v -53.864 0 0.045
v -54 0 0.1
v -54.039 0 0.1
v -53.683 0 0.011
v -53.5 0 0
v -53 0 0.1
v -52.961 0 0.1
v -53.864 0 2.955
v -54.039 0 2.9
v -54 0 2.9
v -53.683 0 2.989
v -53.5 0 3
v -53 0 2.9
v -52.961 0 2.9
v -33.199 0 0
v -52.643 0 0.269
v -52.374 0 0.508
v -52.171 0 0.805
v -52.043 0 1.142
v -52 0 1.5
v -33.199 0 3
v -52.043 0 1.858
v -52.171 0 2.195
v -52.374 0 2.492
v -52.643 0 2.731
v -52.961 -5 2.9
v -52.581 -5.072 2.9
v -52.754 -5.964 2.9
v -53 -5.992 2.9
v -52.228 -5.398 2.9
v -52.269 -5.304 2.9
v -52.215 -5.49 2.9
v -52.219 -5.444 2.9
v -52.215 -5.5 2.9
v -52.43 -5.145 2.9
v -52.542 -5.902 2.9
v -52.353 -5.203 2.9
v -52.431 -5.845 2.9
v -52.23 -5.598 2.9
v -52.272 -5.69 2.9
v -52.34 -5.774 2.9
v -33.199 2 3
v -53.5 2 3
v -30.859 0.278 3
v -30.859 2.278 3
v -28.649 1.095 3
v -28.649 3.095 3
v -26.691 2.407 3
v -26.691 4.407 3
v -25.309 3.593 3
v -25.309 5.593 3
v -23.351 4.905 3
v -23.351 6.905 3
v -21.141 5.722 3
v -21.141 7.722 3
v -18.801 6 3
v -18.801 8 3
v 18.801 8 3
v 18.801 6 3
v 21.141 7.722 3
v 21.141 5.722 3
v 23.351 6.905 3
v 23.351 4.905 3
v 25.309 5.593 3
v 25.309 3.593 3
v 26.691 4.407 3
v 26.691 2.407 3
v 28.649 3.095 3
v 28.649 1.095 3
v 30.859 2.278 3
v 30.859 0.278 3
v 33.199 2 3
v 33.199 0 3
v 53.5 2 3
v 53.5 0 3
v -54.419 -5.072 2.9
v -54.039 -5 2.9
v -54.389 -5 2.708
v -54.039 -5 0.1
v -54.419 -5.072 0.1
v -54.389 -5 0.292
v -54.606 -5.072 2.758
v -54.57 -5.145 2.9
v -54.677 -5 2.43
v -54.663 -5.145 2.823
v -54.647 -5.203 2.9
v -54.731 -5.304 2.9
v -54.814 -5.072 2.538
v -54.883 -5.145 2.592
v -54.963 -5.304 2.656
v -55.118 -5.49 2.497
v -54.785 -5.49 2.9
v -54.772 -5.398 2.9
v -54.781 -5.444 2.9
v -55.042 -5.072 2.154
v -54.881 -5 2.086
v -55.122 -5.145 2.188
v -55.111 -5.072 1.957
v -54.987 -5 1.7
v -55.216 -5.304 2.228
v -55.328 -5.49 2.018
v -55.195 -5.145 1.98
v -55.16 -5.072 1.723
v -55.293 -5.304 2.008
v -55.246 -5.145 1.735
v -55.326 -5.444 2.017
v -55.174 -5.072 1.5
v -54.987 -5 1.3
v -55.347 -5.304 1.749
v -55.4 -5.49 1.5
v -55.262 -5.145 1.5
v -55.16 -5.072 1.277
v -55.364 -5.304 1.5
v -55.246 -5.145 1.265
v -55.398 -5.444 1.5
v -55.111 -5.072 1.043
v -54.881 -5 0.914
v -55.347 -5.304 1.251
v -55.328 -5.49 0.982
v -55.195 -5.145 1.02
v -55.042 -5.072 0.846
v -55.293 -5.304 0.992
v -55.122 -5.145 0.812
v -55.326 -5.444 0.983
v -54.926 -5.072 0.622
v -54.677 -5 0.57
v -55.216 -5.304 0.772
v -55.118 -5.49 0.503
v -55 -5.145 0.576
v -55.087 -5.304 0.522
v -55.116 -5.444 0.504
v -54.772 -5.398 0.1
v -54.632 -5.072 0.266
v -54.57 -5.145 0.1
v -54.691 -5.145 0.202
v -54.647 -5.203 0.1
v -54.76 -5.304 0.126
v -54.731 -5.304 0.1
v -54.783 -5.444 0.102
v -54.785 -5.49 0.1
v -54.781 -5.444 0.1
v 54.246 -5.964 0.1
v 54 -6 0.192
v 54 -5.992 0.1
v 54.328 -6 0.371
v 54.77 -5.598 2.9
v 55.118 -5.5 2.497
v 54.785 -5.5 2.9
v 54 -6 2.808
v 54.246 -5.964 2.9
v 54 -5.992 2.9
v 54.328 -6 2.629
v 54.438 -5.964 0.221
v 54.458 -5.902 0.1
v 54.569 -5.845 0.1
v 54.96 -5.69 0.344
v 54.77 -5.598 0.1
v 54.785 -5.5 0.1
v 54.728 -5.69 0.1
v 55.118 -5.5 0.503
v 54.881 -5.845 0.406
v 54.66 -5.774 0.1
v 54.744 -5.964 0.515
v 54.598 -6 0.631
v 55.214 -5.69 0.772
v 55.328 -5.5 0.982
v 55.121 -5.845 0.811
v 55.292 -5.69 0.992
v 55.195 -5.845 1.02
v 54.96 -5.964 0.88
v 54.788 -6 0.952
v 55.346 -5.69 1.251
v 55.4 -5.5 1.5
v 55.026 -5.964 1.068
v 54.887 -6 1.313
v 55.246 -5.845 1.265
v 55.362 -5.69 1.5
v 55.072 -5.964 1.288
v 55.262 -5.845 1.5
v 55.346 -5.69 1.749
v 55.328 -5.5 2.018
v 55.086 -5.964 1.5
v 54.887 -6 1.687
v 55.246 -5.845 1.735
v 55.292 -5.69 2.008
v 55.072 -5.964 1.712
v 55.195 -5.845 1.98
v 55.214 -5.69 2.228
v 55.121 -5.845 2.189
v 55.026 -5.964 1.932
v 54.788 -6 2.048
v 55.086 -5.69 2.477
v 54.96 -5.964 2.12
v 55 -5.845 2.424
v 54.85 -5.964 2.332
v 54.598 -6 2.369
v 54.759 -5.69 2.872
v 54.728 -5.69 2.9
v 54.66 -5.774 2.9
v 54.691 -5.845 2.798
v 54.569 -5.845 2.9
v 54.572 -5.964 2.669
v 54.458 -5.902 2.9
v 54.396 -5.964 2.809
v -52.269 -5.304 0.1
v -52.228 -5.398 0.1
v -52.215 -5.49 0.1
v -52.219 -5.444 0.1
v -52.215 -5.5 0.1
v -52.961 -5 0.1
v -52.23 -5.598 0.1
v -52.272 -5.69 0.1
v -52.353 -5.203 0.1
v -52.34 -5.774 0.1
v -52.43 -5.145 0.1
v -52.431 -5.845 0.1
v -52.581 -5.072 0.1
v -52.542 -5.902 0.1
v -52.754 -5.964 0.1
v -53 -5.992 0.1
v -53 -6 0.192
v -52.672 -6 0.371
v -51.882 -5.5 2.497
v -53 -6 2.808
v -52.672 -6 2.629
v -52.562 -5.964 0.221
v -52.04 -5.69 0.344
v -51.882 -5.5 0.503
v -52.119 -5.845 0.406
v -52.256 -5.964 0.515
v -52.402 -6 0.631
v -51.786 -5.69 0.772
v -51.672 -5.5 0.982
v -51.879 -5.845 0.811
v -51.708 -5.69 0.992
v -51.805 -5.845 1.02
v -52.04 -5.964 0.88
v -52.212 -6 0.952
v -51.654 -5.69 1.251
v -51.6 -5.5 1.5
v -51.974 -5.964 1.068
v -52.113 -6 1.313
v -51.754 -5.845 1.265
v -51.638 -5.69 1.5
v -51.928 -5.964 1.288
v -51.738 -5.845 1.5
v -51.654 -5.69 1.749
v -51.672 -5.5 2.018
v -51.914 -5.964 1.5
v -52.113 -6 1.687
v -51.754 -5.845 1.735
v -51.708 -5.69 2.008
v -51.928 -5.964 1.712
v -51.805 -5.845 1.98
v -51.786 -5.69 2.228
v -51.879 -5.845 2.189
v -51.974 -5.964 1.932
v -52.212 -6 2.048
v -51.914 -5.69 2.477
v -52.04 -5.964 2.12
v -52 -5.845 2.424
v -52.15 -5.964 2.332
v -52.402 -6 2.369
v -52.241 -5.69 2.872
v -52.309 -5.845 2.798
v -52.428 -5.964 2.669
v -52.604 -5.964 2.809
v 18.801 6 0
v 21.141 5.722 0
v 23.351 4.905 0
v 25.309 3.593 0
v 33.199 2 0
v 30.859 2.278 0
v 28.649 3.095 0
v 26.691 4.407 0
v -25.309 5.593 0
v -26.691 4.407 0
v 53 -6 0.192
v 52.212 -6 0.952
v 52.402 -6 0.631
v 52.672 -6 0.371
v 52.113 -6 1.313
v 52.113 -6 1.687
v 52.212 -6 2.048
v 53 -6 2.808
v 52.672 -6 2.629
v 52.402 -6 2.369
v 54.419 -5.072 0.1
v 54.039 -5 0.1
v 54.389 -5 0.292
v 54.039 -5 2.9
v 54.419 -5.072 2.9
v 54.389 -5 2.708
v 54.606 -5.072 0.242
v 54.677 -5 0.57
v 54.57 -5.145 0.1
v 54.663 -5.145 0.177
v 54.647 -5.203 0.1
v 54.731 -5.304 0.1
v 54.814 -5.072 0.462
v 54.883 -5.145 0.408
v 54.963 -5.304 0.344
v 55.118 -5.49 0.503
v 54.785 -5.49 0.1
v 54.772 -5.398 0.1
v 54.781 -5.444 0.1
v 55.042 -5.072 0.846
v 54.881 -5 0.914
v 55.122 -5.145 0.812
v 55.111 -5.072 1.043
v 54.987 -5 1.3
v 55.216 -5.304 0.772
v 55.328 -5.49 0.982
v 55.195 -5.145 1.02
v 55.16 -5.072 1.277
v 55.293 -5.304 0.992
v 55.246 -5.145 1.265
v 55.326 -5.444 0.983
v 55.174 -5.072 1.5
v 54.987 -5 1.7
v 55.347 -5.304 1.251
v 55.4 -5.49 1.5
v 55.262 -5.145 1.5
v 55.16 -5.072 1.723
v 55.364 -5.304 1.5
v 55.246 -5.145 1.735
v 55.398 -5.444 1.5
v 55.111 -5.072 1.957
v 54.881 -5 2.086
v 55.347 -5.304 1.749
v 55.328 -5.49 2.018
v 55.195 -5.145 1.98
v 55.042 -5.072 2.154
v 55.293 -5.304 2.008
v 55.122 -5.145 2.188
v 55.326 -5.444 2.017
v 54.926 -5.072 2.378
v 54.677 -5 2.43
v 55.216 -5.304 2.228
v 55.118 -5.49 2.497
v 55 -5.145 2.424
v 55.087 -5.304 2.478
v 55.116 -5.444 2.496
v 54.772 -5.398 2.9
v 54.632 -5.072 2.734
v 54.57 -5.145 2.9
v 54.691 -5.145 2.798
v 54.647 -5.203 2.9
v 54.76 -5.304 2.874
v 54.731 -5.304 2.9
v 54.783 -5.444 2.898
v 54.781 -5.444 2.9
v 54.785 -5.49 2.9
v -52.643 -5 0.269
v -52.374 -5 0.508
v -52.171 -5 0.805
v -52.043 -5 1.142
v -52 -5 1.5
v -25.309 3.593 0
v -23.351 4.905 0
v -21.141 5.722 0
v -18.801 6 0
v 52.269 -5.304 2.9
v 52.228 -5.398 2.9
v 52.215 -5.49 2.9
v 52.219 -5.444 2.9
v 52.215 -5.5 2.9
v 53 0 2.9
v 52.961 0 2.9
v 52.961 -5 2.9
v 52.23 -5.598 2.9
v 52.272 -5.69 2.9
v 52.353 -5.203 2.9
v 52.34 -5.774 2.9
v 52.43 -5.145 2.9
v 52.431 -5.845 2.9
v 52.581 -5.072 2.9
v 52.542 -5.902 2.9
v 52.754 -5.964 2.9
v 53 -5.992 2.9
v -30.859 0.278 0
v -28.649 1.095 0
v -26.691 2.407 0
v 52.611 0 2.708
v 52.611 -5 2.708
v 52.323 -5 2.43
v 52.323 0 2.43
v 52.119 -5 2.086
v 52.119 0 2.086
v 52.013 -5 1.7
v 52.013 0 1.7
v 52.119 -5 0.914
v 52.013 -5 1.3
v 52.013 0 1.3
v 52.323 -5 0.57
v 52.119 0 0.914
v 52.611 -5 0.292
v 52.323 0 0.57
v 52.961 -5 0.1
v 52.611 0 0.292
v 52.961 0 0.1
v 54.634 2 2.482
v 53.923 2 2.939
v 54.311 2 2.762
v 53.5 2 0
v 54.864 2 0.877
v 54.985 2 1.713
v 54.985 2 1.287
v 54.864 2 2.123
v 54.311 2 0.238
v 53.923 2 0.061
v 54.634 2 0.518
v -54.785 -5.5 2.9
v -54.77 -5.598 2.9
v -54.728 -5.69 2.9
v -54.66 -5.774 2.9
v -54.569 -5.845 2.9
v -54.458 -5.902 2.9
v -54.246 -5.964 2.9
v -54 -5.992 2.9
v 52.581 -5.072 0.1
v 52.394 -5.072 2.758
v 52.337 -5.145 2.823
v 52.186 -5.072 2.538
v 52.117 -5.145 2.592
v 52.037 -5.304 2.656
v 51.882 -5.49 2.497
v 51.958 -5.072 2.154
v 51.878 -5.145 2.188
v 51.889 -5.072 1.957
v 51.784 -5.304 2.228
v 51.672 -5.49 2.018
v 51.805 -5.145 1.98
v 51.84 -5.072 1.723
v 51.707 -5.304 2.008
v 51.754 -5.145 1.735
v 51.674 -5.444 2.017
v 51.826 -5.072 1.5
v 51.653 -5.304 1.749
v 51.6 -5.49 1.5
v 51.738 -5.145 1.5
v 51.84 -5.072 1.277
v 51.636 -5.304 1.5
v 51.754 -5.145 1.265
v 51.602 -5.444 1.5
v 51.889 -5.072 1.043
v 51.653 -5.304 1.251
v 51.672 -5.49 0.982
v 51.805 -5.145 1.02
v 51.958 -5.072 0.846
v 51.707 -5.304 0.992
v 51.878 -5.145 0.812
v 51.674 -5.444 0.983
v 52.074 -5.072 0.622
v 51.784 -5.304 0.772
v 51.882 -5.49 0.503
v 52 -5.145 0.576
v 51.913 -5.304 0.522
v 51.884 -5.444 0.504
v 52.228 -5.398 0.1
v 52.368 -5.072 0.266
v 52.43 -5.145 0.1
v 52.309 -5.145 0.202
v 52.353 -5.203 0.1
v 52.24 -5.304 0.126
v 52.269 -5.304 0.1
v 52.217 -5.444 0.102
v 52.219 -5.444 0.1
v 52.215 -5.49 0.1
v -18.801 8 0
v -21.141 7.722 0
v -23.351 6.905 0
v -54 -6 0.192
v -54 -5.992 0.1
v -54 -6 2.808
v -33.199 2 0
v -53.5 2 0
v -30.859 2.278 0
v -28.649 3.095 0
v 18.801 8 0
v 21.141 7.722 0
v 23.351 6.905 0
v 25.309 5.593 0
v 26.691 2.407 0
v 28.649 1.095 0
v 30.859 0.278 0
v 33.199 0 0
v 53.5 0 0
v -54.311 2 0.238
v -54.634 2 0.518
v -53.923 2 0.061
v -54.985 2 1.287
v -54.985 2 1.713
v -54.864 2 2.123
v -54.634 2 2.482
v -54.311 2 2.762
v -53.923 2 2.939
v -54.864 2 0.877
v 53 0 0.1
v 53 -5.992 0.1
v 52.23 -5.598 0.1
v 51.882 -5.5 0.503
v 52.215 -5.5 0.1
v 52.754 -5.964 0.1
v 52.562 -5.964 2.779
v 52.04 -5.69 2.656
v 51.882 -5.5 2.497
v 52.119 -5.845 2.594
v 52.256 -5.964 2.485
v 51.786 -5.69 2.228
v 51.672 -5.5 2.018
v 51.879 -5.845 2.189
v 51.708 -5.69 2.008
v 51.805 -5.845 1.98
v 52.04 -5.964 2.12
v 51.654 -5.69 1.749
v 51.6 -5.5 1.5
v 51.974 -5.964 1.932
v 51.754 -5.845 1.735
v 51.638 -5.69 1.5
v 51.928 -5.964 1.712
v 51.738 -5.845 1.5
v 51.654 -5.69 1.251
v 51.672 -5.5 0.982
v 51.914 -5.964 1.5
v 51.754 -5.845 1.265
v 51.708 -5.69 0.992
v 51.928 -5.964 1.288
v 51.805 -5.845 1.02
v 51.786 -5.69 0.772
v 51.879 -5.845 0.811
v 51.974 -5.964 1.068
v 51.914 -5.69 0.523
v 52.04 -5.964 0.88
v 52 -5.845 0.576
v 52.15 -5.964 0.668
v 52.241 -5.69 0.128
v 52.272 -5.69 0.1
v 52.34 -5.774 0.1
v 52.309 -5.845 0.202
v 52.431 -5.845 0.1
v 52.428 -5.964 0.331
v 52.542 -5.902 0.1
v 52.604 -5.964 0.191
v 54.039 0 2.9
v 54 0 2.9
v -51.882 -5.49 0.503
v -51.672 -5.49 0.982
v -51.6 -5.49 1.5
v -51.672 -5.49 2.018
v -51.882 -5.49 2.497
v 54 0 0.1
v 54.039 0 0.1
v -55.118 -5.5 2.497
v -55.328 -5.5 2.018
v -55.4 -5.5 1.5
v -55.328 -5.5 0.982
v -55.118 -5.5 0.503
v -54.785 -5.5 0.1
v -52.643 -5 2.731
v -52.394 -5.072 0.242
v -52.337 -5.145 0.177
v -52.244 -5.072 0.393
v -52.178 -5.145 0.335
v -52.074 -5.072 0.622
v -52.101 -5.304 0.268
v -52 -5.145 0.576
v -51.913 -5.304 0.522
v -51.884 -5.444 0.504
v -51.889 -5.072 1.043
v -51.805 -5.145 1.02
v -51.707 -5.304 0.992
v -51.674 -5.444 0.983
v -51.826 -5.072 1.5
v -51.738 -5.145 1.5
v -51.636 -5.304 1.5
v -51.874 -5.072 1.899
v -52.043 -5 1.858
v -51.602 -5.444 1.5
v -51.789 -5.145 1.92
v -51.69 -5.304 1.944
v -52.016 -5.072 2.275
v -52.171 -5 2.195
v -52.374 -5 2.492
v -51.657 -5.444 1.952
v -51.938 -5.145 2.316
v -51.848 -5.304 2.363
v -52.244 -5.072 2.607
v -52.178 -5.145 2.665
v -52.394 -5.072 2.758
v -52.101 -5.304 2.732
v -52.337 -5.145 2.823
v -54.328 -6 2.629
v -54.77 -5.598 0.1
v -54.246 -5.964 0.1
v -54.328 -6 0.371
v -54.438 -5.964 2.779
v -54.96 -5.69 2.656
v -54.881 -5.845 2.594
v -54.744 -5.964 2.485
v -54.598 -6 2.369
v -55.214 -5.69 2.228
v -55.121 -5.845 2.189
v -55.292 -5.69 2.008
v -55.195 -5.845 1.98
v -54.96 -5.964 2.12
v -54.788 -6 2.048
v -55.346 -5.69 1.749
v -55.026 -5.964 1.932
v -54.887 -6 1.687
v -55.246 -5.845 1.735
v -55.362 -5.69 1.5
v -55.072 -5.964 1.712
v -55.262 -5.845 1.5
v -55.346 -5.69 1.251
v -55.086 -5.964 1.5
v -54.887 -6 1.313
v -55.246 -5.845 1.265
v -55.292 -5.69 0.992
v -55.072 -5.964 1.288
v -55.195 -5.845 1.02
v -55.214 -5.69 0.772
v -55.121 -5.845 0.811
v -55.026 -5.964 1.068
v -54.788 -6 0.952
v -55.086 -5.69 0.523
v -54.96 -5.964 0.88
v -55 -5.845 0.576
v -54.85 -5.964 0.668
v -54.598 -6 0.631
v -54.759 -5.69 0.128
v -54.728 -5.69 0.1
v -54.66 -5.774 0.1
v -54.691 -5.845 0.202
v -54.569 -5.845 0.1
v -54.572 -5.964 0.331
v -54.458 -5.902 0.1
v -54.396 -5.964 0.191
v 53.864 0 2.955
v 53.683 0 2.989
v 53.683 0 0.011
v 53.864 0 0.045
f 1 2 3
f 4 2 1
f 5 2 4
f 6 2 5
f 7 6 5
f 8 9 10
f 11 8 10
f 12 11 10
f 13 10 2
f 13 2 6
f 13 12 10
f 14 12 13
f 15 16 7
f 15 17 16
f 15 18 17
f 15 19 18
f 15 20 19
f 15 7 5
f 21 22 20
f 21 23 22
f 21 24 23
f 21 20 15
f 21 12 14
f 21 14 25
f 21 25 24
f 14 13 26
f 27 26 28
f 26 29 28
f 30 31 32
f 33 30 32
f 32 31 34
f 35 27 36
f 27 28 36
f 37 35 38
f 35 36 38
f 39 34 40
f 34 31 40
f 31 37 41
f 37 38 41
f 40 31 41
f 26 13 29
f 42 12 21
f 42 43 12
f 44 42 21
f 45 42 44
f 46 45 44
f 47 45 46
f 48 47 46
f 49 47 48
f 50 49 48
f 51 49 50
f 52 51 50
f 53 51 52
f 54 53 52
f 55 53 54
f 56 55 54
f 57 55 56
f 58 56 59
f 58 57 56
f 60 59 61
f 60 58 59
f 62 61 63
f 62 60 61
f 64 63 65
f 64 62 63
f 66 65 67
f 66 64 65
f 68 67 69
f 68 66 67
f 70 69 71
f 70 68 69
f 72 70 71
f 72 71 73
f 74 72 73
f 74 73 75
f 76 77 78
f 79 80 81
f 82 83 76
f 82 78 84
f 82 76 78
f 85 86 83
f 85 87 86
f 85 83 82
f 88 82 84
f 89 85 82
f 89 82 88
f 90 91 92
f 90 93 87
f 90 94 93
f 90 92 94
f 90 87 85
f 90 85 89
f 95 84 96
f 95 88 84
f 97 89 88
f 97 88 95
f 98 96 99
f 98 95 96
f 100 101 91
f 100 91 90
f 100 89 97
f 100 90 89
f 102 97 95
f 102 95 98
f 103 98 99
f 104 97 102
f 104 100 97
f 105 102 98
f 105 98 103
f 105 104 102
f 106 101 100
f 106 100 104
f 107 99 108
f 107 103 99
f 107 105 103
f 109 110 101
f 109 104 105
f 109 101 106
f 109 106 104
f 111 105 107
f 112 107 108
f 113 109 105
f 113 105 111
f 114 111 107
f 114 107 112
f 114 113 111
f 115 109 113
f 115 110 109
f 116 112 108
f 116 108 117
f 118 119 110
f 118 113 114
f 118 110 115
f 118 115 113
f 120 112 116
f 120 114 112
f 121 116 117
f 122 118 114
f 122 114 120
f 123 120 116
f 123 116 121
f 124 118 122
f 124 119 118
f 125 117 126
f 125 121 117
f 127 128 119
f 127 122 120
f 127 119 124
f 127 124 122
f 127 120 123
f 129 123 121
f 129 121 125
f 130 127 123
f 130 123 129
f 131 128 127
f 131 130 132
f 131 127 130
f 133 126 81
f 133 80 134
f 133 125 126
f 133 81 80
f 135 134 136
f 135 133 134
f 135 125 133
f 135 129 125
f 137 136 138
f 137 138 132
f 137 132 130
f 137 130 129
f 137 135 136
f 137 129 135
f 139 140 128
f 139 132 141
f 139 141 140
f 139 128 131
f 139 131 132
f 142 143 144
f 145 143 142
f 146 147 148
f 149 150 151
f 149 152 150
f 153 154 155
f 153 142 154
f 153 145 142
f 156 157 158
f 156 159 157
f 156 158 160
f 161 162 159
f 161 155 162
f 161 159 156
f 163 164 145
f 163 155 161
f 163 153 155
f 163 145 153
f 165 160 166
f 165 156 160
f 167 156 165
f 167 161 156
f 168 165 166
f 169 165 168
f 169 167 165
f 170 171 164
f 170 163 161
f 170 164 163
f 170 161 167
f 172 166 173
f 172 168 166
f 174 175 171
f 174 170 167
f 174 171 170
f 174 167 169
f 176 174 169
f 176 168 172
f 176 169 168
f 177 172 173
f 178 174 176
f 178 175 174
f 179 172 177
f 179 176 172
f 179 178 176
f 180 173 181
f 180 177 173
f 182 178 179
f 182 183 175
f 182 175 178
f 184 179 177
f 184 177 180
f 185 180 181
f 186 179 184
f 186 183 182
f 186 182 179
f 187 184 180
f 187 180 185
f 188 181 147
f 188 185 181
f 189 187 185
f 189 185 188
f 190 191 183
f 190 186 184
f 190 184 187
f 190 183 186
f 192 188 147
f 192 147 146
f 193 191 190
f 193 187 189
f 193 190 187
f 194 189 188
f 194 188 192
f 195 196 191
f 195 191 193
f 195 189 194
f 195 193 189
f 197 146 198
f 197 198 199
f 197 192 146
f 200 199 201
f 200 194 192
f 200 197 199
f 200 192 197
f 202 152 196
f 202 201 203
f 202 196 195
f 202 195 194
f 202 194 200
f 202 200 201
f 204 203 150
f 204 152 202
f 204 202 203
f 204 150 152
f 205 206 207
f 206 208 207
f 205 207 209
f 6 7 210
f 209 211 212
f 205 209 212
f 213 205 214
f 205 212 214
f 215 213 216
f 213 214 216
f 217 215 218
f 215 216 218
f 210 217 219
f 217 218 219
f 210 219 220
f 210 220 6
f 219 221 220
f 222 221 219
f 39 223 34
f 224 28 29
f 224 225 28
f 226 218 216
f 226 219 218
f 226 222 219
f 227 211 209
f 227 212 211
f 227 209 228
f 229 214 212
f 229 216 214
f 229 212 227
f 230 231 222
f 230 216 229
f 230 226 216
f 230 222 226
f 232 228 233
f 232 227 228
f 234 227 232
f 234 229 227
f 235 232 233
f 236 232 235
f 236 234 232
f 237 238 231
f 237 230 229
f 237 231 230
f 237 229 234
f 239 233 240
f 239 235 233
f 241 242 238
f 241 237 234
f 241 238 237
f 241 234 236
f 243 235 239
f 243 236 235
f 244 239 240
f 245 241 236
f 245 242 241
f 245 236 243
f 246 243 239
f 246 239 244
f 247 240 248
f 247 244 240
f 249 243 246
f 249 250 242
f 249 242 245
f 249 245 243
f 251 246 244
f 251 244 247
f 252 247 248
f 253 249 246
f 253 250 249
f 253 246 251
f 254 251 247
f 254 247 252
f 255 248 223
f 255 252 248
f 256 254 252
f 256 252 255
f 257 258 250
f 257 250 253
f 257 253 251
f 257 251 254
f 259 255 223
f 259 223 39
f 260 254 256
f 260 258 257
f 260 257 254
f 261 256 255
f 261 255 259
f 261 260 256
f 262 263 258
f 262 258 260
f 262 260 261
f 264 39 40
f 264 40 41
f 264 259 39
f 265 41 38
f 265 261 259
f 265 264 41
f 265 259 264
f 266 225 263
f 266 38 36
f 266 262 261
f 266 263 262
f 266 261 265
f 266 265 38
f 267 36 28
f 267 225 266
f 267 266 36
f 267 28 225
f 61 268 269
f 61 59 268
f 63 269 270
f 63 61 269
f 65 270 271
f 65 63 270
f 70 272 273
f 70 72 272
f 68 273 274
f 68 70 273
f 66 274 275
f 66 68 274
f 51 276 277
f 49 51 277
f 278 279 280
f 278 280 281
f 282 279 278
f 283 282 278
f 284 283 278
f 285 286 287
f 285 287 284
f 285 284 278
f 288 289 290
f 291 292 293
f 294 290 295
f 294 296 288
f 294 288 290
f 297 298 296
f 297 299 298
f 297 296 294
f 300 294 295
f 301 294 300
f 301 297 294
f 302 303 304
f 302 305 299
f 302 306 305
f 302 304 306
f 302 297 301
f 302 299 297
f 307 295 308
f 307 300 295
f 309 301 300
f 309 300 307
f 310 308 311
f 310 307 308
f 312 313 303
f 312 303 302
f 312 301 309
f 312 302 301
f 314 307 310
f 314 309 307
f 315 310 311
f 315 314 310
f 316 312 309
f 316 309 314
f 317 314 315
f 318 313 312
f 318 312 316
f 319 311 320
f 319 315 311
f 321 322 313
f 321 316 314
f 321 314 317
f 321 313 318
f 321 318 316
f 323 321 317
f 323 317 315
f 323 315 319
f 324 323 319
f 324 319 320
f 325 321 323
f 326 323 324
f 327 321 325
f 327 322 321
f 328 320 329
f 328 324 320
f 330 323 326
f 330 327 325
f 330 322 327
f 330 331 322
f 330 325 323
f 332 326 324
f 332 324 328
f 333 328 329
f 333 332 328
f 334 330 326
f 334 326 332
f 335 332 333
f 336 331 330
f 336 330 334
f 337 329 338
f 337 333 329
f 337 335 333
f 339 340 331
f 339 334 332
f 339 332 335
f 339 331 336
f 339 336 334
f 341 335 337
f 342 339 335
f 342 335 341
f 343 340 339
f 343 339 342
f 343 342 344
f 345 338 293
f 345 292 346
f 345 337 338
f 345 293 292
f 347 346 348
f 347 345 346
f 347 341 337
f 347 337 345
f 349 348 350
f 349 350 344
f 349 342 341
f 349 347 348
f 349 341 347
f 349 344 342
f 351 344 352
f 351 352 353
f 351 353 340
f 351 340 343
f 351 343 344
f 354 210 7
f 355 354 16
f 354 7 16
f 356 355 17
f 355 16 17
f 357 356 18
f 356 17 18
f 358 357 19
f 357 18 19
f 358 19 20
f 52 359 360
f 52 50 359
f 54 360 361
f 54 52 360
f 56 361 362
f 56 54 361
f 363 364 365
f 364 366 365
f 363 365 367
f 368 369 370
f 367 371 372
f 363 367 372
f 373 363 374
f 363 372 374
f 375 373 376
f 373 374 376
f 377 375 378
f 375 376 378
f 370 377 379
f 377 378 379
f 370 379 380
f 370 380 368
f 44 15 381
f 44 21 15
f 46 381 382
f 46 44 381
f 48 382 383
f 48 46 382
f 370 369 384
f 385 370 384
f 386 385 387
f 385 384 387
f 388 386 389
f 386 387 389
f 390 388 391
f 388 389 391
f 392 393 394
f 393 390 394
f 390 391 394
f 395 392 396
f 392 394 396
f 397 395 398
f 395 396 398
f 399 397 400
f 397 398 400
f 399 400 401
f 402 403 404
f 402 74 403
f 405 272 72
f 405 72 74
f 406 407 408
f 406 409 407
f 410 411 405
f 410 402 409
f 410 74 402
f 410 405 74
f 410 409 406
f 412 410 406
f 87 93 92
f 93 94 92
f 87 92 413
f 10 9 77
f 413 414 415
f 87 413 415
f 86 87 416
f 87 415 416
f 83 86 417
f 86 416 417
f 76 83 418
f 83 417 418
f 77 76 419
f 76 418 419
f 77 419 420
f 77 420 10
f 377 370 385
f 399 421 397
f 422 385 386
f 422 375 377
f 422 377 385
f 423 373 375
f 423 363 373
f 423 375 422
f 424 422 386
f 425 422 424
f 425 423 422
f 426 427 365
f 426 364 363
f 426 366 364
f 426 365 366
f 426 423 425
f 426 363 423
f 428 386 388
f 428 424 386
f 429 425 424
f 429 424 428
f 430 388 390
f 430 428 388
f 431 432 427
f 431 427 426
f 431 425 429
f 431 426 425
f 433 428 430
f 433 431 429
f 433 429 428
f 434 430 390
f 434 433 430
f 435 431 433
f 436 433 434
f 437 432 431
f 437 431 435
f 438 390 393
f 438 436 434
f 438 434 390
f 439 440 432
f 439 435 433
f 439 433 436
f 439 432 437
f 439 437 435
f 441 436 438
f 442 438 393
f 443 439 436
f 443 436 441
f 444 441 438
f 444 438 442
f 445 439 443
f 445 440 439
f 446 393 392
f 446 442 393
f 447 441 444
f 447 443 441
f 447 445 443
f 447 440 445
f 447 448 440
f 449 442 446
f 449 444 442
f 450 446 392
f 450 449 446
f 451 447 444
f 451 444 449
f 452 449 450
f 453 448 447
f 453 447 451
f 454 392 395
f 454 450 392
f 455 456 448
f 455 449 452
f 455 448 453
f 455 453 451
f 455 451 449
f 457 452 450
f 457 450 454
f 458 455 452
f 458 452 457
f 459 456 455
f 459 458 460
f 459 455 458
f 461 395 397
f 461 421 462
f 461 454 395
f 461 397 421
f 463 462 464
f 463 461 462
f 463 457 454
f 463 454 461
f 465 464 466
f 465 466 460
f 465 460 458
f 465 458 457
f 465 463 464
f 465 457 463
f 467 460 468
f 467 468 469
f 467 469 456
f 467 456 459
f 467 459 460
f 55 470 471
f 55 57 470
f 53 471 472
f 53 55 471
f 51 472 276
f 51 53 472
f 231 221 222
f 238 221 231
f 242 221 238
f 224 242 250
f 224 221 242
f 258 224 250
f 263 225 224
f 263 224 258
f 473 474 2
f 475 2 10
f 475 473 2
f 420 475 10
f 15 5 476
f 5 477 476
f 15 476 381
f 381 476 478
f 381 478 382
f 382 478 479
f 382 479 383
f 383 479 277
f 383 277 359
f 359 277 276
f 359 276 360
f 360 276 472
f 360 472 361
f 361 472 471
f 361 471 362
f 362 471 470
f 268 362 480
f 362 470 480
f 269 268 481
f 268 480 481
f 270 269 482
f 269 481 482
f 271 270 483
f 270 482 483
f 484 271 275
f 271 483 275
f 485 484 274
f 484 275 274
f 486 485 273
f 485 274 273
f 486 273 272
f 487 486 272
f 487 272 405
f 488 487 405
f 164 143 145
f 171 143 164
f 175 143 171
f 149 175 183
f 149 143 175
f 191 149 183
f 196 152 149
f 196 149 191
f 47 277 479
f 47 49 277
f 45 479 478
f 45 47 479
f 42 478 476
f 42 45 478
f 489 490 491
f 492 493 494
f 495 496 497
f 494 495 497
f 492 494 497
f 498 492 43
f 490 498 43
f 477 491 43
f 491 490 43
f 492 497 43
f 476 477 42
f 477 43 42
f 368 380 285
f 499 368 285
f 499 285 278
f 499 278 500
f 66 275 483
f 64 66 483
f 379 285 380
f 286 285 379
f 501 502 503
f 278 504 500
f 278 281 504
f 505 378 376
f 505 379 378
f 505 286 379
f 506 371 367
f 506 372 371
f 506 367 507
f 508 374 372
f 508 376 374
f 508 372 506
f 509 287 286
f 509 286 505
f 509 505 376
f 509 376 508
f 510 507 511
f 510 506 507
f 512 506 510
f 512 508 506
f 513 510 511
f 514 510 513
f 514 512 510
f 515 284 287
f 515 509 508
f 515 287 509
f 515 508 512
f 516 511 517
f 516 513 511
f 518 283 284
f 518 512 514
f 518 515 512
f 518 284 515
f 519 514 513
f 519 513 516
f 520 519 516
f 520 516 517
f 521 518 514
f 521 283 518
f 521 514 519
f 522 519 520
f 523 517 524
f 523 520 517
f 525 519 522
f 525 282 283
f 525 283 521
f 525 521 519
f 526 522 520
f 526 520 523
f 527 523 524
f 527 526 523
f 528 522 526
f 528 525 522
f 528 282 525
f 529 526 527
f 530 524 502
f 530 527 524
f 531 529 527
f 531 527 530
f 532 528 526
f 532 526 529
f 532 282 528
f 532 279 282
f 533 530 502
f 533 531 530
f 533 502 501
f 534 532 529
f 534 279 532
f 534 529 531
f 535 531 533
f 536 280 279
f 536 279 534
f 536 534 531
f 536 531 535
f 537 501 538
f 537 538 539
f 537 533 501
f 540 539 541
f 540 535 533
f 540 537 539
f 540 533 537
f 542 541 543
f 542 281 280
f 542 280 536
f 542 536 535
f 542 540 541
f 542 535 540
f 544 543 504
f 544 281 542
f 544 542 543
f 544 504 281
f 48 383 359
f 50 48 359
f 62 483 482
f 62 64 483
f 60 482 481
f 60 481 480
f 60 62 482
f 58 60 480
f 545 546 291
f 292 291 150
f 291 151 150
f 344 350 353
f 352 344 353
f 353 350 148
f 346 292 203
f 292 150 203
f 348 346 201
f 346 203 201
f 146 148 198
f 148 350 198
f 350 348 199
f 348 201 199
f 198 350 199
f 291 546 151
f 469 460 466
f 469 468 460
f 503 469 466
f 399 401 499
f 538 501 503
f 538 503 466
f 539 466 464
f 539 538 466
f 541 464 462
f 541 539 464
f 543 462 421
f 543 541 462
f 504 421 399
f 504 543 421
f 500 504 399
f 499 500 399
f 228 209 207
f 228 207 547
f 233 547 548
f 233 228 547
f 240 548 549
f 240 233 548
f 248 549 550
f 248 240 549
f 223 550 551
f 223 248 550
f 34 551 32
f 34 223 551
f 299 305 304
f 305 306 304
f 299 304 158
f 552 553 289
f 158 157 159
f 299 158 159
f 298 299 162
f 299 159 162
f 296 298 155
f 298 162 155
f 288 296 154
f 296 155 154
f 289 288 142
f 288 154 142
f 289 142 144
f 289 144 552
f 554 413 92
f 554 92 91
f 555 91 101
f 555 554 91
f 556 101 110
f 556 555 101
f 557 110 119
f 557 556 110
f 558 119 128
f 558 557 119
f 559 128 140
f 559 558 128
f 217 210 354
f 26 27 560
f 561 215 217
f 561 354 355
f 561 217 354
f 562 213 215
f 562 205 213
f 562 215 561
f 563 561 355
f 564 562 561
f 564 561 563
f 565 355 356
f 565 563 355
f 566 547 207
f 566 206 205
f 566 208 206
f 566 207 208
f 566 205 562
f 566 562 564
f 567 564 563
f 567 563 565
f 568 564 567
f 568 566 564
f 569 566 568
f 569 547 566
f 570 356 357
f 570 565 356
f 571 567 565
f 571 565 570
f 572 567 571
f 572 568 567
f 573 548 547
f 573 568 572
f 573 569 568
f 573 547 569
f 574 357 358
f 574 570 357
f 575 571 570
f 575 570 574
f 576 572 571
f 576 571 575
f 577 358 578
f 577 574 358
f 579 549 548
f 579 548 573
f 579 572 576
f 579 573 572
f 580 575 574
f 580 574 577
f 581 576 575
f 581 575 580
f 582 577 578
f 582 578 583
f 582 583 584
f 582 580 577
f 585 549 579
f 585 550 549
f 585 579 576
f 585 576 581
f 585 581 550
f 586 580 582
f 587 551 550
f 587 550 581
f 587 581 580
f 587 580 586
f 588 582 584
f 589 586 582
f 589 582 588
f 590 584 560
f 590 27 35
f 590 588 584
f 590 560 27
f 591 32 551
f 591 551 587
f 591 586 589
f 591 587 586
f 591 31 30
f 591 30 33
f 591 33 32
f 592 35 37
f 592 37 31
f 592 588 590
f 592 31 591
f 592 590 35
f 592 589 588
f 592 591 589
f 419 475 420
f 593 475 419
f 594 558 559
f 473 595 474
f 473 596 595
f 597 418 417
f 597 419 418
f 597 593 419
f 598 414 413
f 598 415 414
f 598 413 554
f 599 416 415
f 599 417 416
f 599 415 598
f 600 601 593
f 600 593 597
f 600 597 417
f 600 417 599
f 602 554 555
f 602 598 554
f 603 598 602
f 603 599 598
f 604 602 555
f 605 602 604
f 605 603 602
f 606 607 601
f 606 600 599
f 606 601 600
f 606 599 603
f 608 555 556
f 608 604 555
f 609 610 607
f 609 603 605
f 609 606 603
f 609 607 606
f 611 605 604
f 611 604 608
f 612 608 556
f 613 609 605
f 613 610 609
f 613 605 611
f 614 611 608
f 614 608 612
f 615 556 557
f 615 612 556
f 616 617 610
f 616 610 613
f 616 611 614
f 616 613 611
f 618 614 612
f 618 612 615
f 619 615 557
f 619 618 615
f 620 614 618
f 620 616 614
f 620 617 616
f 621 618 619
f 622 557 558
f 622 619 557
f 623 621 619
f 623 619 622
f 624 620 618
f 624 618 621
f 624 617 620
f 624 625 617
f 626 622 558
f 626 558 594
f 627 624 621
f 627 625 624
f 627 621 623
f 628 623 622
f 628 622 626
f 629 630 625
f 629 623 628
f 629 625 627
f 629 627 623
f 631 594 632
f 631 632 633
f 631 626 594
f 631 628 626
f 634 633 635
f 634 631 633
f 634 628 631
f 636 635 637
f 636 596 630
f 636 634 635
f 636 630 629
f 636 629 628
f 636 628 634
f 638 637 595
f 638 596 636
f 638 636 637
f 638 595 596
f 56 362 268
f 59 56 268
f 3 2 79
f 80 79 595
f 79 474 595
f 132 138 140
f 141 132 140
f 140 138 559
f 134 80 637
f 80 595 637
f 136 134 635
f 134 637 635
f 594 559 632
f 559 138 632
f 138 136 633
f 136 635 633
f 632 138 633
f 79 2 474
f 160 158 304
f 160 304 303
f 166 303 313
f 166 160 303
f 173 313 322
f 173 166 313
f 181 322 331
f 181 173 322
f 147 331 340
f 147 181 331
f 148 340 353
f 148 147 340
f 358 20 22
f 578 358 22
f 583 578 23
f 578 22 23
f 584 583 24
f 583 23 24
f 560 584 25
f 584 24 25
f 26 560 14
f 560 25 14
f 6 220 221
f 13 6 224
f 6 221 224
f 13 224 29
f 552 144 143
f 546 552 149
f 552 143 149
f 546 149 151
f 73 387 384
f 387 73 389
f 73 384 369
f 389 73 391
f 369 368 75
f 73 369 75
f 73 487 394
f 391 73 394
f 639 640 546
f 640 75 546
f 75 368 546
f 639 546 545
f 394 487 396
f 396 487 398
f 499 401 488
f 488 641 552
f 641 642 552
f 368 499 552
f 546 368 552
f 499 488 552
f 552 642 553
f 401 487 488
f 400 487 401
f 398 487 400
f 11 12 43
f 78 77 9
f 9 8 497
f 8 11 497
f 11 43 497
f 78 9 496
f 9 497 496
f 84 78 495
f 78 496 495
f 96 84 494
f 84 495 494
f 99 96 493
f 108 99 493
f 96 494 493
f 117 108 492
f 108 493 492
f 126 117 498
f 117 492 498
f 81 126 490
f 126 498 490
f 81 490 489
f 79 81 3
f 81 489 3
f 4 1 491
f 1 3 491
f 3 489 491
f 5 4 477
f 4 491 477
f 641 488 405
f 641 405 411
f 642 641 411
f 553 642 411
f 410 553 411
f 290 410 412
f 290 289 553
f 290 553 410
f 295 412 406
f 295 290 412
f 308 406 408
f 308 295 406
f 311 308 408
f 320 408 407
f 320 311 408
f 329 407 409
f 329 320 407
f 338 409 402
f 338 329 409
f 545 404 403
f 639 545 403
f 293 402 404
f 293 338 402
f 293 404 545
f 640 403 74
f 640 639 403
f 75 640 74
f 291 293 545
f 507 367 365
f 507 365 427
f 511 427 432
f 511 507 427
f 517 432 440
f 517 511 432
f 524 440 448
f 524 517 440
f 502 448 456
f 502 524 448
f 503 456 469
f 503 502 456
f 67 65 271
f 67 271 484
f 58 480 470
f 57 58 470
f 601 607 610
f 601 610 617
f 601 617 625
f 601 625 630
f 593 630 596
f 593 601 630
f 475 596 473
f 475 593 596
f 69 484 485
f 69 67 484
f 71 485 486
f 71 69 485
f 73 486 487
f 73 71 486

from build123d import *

# Parameters (mm, degrees)
F0_W      = 24
F0_H      = 2
F0_W_2    = 22.5
F1_DEPTH  = 3
F2_R      = 10
F3_R      = 1.5
F4_DEPTH  = 2
F5_DEPTH  = 6
F6_R      = 1.9
F6_R_2    = 1.5
F7_DEPTH  = 1
F9_W      = 1
F9_H      = 3.4420455096
F9_W_2    = 3.6737932861
F9_H_2    = 0.5
F9_W_3    = 2.2944888771
F9_H_3    = 2.8
F9_W_4    = 3.9643547535
F10_DEPTH = 6


# Not quite as in the source:
# - a fillet or chamfer that OpenCascade refuses, or shapes differently, is made with other operations: its cross-section is extruded or revolved along the edge and cut away or added


with BuildPart() as f1:
    # F0 (on Top) → F1 (new body)
    with BuildSketch(Plane.XY):
        with Locations((-41.5, 1)):
            Rectangle(F0_W, F0_H)
        Polygon((-29.5, 2), (-29.5, 0), (-22.5, 6), (-22.5, 8), align=None)
        with Locations((-11.25, 7)):
            Rectangle(F0_W_2, F0_H)
        with Locations((11.25, 7)):
            Rectangle(F0_W_2, F0_H)
        Polygon((22.5, 8), (22.5, 6), (29.5, 0), (29.5, 2), align=None)
        with Locations((41.5, 1)):
            Rectangle(F0_W, F0_H)
    extrude(amount=F1_DEPTH)

    # F2
    f2_edges = [f1.edges().sort_by_distance(p)[0] for p in [
        (-29.5, 2, 1.5),
        (-22.5, 8, 1.5),
        (22.5, 8, 1.5),
        (29.5, 2, 1.5),
        (29.5, 0, 1.5),
        (22.5, 6, 1.5),
        (-22.5, 6, 1.5),
        (-29.5, 0, 1.5),
    ]]
    fillet(f2_edges, radius=F2_R)

    # F3 (on face) → F4 (join, through all)
    with BuildSketch(Plane.XZ):
        with BuildLine():
            Line((-53.5, 0), (-53.5, 3))
            ThreePointArc((-53.5, 3), (-55, 1.5), (-53.5, 0))
        make_face()
        with Locations((53.5, 1.5)):
            Circle(F3_R)
    extrude(amount=-F4_DEPTH)

    # F3 (on face) → F5 (join)
    with BuildSketch(Plane.XZ):
        with BuildLine():
            Line((-53.5, 0), (-53.5, 3))
            ThreePointArc((-53.5, 3), (-55, 1.5), (-53.5, 0))
        make_face()
        with BuildLine():
            ThreePointArc((-53.5, 0), (-52.4393398282, 0.4393398282), (-52, 1.5))
            ThreePointArc((-52, 1.5), (-52.4393398282, 2.5606601718), (-53.5, 3))
            Line((-53.5, 3), (-53.5, 0))
        make_face()
        with Locations((53.5, 1.5)):
            Circle(F3_R)
    extrude(amount=F5_DEPTH)

    # F6 (on face) → F7 (join)
    with BuildSketch(Plane.XZ.offset(6)):
        with Locations((-53.5, 1.5)):
            Circle(F6_R)
        with Locations((-53.5, 1.5)):
            Circle(F6_R_2, mode=Mode.SUBTRACT)
        with Locations((53.5, 1.5)):
            Circle(F6_R)
    extrude(amount=-F7_DEPTH)

    # F8: fillet of radius 0.5 on 4 edges, made by hand

    # F8_s1 → F8_t2 (revolve, cut)
    with BuildSketch(Plane.XY.offset(1.5)):
        with BuildLine():
            ThreePointArc((-51.6, -5.5), (-51.7464466094, -5.8535533906), (-52.1, -6))
            Line((-52.1, -6), (-51.6, -6))
            Line((-51.6, -6), (-51.6, -5.5))
        make_face()
    revolve(axis=Axis((-53.5, -6, 1.5), (0, -1, 0)), mode=Mode.SUBTRACT)

    # F8_s3 → F8_t4 (revolve, cut)
    with BuildSketch(Plane.XY.offset(1.5)):
        with BuildLine():
            ThreePointArc((-52, -5), (-51.7127016654, -5.1736701825), (-51.6, -5.4898979486))
            Line((-51.6, -5.4898979486), (-51.6, -5))
            Line((-51.6, -5), (-52, -5))
        make_face()
    revolve(axis=Axis((-53.5, -5, 1.5), (0, -1, 0)), mode=Mode.SUBTRACT)

    # F8_s5 → F8_t6 (revolve, cut)
    with BuildSketch(Plane.XY.offset(1.5)):
        with BuildLine():
            ThreePointArc((55, -5), (55.2872983346, -5.1736701825), (55.4, -5.4898979486))
            Line((55.4, -5.4898979486), (55.4, -5))
            Line((55.4, -5), (55, -5))
        make_face()
    revolve(axis=Axis((53.5, -5, 1.5), (0, -1, 0)), mode=Mode.SUBTRACT)

    # F8_s7 → F8_t8 (revolve, cut)
    with BuildSketch(Plane.XY.offset(1.5)):
        with BuildLine():
            ThreePointArc((55.4, -5.5), (55.2535533906, -5.8535533906), (54.9, -6))
            Line((54.9, -6), (55.4, -6))
            Line((55.4, -6), (55.4, -5.5))
        make_face()
    revolve(axis=Axis((53.5, -6, 1.5), (0, -1, 0)), mode=Mode.SUBTRACT)

    # F9 (on face) → F10 (cut, through all)
    with BuildSketch(Plane.XZ.offset(6)):
        with Locations((-53.5, -2.1210227548)):
            Rectangle(F9_W, F9_H)
        with Locations((-55.836896643, -0.15)):
            Rectangle(F9_W_2, F9_H_2)
        with Locations((-53.5, -0.15)):
            Rectangle(F9_W, F9_H_2)
        with Locations((-51.8527555615, -0.15)):
            Rectangle(F9_W_3, F9_H_2)
        with Locations((-53.5, 1.5)):
            Rectangle(F9_W, F9_H_3)
        with Locations((-55.9821773767, 3.15)):
            Rectangle(F9_W_4, F9_H_2)
        with Locations((-53.5, 3.15)):
            Rectangle(F9_W, F9_H_2)
        with Locations((-51.8527555615, 3.15)):
            Rectangle(F9_W_3, F9_H_2)
        with Locations((-53.5, 5.1210227548)):
            Rectangle(F9_W, F9_H)
        with Locations((55.836896643, -0.15)):
            Rectangle(F9_W_2, F9_H_2)
        with Locations((53.5, -2.1210227548)):
            Rectangle(F9_W, F9_H)
        with Locations((53.5, -0.15)):
            Rectangle(F9_W, F9_H_2)
        with Locations((53.5, 1.5)):
            Rectangle(F9_W, F9_H_3)
        with Locations((51.8527555615, -0.15)):
            Rectangle(F9_W_3, F9_H_2)
        with Locations((55.9821773767, 3.15)):
            Rectangle(F9_W_4, F9_H_2)
        with Locations((53.5, 3.15)):
            Rectangle(F9_W, F9_H_2)
        with Locations((51.8527555615, 3.15)):
            Rectangle(F9_W_3, F9_H_2)
        with Locations((53.5, 5.1210227548)):
            Rectangle(F9_W, F9_H)
    extrude(amount=-F10_DEPTH, mode=Mode.SUBTRACT)


solid = f1.part
